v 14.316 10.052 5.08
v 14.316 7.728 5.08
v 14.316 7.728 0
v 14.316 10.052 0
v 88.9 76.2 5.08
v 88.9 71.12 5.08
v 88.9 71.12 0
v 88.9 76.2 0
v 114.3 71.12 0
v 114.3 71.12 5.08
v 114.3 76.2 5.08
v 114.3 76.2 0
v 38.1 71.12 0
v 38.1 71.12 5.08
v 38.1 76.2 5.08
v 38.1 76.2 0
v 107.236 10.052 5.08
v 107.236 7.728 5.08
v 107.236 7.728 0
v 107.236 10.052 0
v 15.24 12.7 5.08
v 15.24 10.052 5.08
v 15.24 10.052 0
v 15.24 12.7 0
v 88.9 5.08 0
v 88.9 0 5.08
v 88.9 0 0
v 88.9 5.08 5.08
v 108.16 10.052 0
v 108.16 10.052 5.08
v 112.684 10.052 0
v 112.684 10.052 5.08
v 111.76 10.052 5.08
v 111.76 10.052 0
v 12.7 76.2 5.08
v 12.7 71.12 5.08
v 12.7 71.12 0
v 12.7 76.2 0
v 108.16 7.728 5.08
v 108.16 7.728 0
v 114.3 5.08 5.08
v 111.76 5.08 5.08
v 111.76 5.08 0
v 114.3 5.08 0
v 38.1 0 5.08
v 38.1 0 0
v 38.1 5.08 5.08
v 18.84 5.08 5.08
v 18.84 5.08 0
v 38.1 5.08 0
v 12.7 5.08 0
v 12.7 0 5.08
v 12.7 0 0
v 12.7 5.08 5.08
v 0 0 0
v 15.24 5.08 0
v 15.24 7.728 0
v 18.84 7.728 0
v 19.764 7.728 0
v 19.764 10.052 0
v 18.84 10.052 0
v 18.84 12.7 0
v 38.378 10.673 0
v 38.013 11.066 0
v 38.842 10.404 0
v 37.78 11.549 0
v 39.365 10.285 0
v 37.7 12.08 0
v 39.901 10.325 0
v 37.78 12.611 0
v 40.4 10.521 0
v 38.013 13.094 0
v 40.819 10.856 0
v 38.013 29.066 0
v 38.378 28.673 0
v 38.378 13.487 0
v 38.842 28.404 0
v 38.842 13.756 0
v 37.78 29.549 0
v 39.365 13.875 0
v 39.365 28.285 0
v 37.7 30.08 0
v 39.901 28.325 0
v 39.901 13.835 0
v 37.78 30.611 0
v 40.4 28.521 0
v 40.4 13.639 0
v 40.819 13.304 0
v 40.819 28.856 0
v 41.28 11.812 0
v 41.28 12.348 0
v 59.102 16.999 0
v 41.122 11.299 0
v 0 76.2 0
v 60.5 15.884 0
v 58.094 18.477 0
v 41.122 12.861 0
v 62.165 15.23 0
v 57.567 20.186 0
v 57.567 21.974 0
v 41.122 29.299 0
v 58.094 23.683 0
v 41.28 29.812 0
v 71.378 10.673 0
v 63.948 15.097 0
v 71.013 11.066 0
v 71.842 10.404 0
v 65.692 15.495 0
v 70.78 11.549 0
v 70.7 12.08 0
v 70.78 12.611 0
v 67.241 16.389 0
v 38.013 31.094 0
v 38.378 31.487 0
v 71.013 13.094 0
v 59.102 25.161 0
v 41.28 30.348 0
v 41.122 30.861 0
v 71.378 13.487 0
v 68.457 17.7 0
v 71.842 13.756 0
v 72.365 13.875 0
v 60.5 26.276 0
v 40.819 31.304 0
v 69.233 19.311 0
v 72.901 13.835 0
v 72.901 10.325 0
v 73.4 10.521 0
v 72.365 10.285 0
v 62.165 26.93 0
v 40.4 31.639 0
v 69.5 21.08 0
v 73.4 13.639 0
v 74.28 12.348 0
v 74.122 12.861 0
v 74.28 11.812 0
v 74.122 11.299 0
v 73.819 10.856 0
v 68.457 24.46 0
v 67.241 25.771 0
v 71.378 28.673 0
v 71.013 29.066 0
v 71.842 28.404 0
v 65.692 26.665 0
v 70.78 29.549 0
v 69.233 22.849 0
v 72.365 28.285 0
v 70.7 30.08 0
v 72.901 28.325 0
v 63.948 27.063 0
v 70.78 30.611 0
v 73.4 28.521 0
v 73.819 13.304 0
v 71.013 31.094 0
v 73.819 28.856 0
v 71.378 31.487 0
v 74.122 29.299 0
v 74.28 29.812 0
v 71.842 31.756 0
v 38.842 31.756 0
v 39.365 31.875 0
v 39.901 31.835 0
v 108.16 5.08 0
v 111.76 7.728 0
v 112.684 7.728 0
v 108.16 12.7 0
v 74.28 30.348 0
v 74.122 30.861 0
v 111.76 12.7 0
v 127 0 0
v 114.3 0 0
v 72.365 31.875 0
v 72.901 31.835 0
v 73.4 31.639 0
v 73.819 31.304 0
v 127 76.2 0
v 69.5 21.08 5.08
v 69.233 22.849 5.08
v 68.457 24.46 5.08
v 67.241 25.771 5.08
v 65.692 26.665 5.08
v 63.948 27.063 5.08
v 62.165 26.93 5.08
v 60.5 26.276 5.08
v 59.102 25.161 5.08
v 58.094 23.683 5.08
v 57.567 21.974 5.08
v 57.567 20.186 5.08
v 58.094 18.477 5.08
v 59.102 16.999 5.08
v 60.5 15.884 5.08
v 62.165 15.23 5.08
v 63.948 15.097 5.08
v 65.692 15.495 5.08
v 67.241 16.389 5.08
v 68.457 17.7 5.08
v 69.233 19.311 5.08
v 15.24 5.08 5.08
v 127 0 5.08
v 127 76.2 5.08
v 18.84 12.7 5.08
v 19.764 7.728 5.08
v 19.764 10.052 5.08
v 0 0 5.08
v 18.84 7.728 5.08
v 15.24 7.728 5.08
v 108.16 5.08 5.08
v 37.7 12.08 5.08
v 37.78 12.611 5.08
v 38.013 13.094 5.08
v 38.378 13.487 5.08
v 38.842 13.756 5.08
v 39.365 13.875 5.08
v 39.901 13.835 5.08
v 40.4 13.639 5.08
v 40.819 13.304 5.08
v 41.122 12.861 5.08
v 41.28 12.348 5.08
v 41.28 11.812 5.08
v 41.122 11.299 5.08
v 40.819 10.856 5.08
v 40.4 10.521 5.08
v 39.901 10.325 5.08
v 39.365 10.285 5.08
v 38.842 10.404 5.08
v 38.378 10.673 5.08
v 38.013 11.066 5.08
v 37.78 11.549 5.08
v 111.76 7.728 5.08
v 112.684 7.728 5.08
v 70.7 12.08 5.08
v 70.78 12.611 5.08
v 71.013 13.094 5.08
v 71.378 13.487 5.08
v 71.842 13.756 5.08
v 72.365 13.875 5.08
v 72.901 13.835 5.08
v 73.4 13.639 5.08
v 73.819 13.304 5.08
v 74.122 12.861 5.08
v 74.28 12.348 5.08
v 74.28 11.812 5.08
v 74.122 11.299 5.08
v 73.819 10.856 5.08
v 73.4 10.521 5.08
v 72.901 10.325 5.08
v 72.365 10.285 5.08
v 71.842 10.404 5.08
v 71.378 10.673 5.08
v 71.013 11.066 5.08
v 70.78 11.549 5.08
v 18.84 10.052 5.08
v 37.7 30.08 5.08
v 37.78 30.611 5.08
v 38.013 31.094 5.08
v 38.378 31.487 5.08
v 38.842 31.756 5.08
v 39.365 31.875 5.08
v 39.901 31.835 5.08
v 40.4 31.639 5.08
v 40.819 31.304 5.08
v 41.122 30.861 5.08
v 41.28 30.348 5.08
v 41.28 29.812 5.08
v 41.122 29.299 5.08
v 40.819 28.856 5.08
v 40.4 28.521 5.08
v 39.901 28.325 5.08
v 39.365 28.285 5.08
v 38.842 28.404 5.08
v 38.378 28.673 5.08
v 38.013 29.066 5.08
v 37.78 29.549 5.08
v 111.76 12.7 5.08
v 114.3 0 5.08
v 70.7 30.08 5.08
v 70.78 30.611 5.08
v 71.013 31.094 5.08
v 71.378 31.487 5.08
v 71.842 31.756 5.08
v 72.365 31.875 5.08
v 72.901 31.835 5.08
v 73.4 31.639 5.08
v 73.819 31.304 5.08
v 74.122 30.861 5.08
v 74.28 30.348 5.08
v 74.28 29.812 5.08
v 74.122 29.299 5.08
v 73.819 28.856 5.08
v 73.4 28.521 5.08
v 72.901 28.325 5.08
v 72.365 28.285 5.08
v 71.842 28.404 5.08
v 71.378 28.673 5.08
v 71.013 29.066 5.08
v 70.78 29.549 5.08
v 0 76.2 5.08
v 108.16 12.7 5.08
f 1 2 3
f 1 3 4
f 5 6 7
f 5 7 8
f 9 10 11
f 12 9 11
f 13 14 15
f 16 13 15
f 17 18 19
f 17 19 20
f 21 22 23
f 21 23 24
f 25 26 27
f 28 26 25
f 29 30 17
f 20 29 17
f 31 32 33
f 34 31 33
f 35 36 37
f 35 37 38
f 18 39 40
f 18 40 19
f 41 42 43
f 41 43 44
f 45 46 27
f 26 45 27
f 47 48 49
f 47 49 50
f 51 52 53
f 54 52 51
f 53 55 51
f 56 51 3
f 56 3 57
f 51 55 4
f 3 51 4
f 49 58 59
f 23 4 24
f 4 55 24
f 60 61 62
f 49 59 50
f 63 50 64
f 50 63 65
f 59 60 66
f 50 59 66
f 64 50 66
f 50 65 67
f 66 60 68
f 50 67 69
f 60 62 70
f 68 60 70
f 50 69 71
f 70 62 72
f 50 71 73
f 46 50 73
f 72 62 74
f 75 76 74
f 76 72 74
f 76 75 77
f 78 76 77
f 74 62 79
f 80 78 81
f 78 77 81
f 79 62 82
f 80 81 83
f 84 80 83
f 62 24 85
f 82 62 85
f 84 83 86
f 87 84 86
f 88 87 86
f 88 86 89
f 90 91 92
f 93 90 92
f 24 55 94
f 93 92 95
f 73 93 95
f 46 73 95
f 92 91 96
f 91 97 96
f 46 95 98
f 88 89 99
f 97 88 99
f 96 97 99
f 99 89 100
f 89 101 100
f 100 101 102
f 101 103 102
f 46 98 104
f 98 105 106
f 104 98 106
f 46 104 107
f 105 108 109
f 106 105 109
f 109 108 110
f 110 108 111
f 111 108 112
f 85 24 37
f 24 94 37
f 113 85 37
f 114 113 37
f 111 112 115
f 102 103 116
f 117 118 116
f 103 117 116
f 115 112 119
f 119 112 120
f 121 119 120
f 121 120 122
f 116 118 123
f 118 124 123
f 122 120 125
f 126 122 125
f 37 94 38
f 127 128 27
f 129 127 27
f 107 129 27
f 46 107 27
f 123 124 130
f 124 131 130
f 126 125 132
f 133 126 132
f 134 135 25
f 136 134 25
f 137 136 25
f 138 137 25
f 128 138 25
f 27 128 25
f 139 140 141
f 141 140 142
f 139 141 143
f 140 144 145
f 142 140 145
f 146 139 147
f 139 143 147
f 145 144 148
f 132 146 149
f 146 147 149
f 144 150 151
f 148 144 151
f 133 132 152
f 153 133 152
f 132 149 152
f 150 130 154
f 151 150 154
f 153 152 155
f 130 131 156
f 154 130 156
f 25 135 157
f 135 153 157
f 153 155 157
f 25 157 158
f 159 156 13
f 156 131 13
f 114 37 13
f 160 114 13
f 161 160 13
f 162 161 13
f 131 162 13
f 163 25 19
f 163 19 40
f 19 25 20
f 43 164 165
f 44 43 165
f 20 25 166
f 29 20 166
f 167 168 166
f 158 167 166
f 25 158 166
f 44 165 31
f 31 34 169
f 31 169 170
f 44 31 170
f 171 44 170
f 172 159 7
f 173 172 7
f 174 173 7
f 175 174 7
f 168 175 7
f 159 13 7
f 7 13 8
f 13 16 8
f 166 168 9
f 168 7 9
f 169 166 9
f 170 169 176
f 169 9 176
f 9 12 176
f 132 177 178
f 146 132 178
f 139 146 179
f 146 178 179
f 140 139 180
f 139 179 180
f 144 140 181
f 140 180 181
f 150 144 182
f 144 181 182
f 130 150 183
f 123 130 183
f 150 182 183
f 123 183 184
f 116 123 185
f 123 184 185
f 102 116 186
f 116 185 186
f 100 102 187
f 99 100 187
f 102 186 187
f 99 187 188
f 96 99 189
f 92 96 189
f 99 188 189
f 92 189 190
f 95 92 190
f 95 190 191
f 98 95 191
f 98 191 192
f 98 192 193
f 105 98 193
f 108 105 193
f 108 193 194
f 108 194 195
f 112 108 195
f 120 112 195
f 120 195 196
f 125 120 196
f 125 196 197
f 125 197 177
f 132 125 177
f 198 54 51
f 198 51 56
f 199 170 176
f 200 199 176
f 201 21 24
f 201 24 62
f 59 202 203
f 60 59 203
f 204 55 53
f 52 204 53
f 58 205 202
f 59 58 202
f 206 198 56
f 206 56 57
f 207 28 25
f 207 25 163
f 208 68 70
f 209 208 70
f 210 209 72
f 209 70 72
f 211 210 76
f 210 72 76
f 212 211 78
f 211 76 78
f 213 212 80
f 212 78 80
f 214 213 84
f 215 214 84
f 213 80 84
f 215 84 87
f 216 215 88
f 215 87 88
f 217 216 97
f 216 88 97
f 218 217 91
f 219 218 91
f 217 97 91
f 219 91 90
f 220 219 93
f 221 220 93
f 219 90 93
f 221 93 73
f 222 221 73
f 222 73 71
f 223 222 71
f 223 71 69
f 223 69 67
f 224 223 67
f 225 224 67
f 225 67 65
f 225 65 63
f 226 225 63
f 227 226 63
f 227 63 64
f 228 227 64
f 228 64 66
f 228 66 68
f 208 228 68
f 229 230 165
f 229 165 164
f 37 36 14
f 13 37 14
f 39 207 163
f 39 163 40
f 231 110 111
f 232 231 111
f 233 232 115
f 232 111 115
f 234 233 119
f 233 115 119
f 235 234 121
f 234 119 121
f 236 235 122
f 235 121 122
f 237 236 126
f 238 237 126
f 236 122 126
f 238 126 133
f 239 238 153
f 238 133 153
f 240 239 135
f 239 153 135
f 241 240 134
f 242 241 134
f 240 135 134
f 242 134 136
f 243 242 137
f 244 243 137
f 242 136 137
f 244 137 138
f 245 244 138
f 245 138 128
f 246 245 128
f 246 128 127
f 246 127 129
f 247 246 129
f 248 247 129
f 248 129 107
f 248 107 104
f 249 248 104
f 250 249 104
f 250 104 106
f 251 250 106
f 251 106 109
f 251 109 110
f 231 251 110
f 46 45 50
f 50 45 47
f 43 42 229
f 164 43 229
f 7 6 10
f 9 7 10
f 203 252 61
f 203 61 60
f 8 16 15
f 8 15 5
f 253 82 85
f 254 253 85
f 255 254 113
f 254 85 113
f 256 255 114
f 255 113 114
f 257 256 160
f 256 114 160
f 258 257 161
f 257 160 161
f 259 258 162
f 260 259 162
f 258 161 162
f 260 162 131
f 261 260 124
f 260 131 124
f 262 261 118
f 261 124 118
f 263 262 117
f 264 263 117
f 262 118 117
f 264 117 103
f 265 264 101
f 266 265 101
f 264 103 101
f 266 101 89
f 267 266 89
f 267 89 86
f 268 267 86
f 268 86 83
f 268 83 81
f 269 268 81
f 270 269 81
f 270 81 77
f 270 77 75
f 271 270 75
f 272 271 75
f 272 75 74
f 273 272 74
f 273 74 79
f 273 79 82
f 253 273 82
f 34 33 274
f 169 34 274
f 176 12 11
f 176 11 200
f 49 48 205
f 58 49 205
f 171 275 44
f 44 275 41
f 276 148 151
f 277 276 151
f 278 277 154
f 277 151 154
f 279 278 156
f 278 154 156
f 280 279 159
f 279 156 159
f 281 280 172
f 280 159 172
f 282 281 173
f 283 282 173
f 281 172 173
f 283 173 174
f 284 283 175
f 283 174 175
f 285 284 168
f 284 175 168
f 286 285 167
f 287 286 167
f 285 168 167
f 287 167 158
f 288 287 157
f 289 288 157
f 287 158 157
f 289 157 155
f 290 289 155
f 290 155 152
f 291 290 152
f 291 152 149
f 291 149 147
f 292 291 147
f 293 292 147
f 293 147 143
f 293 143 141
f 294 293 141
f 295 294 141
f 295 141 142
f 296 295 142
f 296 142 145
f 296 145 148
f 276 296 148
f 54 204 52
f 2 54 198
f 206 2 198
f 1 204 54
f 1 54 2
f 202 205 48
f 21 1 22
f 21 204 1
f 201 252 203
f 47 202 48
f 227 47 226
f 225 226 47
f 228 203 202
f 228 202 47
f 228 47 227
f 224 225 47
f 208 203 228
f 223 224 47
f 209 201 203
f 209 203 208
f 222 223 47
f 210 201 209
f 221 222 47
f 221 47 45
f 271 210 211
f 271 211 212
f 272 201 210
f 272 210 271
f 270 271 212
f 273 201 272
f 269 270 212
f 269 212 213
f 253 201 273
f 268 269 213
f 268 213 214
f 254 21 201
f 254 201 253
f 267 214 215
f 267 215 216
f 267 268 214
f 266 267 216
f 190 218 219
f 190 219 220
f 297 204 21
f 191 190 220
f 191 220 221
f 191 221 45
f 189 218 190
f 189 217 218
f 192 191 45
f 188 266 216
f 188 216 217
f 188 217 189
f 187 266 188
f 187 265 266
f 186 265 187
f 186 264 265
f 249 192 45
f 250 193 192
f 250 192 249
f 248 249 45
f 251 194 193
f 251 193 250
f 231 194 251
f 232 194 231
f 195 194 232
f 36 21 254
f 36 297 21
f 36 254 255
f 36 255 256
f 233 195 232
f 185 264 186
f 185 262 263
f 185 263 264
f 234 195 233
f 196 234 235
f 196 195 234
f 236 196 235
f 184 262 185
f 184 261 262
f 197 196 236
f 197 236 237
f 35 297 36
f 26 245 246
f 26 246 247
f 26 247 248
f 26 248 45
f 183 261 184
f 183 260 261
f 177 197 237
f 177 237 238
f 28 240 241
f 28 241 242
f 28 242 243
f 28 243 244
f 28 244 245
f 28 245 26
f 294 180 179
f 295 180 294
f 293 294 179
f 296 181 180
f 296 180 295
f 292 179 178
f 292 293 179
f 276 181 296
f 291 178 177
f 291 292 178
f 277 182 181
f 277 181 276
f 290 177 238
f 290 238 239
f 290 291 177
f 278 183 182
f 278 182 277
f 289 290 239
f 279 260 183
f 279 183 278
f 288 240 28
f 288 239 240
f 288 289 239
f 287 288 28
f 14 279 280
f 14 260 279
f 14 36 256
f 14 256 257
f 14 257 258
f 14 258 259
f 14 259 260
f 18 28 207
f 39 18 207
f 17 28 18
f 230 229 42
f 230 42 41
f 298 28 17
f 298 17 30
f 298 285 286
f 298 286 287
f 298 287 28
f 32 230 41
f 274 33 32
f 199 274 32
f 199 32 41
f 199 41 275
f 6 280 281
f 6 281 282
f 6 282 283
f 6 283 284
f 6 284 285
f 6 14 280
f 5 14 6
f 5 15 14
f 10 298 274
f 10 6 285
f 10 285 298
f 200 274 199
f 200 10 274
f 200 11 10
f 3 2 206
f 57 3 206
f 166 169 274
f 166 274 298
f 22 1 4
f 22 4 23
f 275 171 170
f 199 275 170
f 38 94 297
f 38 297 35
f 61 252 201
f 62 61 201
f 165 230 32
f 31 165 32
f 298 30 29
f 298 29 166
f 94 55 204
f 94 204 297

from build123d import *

# Parameters (mm, degrees)
SKETCH1_W                = 127
SKETCH1_H                = 76.2
BOSS_EXTRUDE1_DEPTH      = 5.08
CUT_EXTRUDE1_REACH       = 7.08
SKETCH2_W                = 25.4
SKETCH2_H                = 5.08
SKETCH3_W                = 25.4
SKETCH3_H                = 5.08
CUT_EXTRUDE2_DEPTH       = 6.08
CUT_EXTRUDE3_REACH       = 7.08
SKETCH4_R                = 6
SKETCH8_W                = 3.599999912
SKETCH8_H                = 7.62
CUT_EXTRUDE6_DEPTH       = 5.08
SKETCH9_W                = 5.4483
SKETCH9_H                = 2.3241
CUT_EXTRUDE7_DEPTH       = 5.08
M3_CLEARANCE_HOLE1_D     = 3.6
M3_CLEARANCE_HOLE1_DEPTH = 5.08


with BuildPart() as part:
    # Sketch1 → Boss-Extrude1 (new body)
    with BuildSketch(Plane.XY):
        with Locations((63.5, 38.1)):
            Rectangle(SKETCH1_W, SKETCH1_H)
    extrude(amount=BOSS_EXTRUDE1_DEPTH)

    # Sketch2 → Cut-Extrude1 (cut, up to next)
    with BuildSketch(Plane.XY.offset(5.08), mode=Mode.PRIVATE) as cut_extrude1_sk1:
        with Locations((25.4, 2.54)):
            Rectangle(SKETCH2_W, SKETCH2_H)
    cut_extrude1_tool1 = extrude(cut_extrude1_sk1.sketch, amount=-CUT_EXTRUDE1_REACH, mode=Mode.PRIVATE) & part.part
    add(cut_extrude1_tool1.solids().sort_by_distance((25.4, 2.54, 5.08))[0], mode=Mode.SUBTRACT)
    # Sketch2 → Cut-Extrude1 (cut, up to next)
    with BuildSketch(Plane.XY.offset(5.08), mode=Mode.PRIVATE) as cut_extrude1_sk2:
        with Locations((101.6, 2.54)):
            Rectangle(SKETCH2_W, SKETCH2_H)
    cut_extrude1_tool2 = extrude(cut_extrude1_sk2.sketch, amount=-CUT_EXTRUDE1_REACH, mode=Mode.PRIVATE) & part.part
    add(cut_extrude1_tool2.solids().sort_by_distance((101.6, 2.54, 5.08))[0], mode=Mode.SUBTRACT)

    # Sketch3 → Cut-Extrude2 (cut, through all)
    with BuildSketch(Plane.XY.offset(5.08)):
        with Locations((25.4, 73.66)):
            Rectangle(SKETCH3_W, SKETCH3_H)
        with Locations((101.6, 73.66)):
            Rectangle(SKETCH3_W, SKETCH3_H)
    extrude(amount=-CUT_EXTRUDE2_DEPTH, mode=Mode.SUBTRACT)

    # Sketch4 → Cut-Extrude3 (cut, up to next)
    with BuildSketch(Plane.XY.offset(5.08), mode=Mode.PRIVATE) as cut_extrude3_sk1:
        with Locations((63.5, 21.08)):
            Circle(SKETCH4_R)
    cut_extrude3_tool1 = extrude(cut_extrude3_sk1.sketch, amount=-CUT_EXTRUDE3_REACH, mode=Mode.PRIVATE) & part.part
    add(cut_extrude3_tool1.solids().sort_by_distance((63.5, 21.08, 5.08))[0], mode=Mode.SUBTRACT)

    # Sketch8 → Cut-Extrude6 (cut)
    with BuildSketch(Plane.XY.offset(5.08)):
        with Locations((17.039999956, 8.89)):
            Rectangle(SKETCH8_W, SKETCH8_H)
    cut_extrude6 = extrude(amount=-CUT_EXTRUDE6_DEPTH, mode=Mode.SUBTRACT)

    # Sketch9 → Cut-Extrude7 (cut)
    with BuildSketch(Plane.XY.offset(5.08)):
        with Locations((17.039999956, 8.89)):
            Rectangle(SKETCH9_W, SKETCH9_H)
    cut_extrude7 = extrude(amount=-CUT_EXTRUDE7_DEPTH, mode=Mode.SUBTRACT)

    # Mirror1: Cut-Extrude6, Cut-Extrude7 across plane
    add(cut_extrude6.mirror(Plane.ZY.offset(-63.5)), mode=Mode.SUBTRACT)
    add(cut_extrude7.mirror(Plane.ZY.offset(-63.5)), mode=Mode.SUBTRACT)

    # M3 Clearance Hole1
    with Locations(Plane.XY.offset(5.08)):
        with Locations((39.5, 30.08), (72.5, 30.08), (72.5, 12.08), (39.5, 12.08)):
            Hole(M3_CLEARANCE_HOLE1_D / 2, depth=M3_CLEARANCE_HOLE1_DEPTH)


solid = part.part
